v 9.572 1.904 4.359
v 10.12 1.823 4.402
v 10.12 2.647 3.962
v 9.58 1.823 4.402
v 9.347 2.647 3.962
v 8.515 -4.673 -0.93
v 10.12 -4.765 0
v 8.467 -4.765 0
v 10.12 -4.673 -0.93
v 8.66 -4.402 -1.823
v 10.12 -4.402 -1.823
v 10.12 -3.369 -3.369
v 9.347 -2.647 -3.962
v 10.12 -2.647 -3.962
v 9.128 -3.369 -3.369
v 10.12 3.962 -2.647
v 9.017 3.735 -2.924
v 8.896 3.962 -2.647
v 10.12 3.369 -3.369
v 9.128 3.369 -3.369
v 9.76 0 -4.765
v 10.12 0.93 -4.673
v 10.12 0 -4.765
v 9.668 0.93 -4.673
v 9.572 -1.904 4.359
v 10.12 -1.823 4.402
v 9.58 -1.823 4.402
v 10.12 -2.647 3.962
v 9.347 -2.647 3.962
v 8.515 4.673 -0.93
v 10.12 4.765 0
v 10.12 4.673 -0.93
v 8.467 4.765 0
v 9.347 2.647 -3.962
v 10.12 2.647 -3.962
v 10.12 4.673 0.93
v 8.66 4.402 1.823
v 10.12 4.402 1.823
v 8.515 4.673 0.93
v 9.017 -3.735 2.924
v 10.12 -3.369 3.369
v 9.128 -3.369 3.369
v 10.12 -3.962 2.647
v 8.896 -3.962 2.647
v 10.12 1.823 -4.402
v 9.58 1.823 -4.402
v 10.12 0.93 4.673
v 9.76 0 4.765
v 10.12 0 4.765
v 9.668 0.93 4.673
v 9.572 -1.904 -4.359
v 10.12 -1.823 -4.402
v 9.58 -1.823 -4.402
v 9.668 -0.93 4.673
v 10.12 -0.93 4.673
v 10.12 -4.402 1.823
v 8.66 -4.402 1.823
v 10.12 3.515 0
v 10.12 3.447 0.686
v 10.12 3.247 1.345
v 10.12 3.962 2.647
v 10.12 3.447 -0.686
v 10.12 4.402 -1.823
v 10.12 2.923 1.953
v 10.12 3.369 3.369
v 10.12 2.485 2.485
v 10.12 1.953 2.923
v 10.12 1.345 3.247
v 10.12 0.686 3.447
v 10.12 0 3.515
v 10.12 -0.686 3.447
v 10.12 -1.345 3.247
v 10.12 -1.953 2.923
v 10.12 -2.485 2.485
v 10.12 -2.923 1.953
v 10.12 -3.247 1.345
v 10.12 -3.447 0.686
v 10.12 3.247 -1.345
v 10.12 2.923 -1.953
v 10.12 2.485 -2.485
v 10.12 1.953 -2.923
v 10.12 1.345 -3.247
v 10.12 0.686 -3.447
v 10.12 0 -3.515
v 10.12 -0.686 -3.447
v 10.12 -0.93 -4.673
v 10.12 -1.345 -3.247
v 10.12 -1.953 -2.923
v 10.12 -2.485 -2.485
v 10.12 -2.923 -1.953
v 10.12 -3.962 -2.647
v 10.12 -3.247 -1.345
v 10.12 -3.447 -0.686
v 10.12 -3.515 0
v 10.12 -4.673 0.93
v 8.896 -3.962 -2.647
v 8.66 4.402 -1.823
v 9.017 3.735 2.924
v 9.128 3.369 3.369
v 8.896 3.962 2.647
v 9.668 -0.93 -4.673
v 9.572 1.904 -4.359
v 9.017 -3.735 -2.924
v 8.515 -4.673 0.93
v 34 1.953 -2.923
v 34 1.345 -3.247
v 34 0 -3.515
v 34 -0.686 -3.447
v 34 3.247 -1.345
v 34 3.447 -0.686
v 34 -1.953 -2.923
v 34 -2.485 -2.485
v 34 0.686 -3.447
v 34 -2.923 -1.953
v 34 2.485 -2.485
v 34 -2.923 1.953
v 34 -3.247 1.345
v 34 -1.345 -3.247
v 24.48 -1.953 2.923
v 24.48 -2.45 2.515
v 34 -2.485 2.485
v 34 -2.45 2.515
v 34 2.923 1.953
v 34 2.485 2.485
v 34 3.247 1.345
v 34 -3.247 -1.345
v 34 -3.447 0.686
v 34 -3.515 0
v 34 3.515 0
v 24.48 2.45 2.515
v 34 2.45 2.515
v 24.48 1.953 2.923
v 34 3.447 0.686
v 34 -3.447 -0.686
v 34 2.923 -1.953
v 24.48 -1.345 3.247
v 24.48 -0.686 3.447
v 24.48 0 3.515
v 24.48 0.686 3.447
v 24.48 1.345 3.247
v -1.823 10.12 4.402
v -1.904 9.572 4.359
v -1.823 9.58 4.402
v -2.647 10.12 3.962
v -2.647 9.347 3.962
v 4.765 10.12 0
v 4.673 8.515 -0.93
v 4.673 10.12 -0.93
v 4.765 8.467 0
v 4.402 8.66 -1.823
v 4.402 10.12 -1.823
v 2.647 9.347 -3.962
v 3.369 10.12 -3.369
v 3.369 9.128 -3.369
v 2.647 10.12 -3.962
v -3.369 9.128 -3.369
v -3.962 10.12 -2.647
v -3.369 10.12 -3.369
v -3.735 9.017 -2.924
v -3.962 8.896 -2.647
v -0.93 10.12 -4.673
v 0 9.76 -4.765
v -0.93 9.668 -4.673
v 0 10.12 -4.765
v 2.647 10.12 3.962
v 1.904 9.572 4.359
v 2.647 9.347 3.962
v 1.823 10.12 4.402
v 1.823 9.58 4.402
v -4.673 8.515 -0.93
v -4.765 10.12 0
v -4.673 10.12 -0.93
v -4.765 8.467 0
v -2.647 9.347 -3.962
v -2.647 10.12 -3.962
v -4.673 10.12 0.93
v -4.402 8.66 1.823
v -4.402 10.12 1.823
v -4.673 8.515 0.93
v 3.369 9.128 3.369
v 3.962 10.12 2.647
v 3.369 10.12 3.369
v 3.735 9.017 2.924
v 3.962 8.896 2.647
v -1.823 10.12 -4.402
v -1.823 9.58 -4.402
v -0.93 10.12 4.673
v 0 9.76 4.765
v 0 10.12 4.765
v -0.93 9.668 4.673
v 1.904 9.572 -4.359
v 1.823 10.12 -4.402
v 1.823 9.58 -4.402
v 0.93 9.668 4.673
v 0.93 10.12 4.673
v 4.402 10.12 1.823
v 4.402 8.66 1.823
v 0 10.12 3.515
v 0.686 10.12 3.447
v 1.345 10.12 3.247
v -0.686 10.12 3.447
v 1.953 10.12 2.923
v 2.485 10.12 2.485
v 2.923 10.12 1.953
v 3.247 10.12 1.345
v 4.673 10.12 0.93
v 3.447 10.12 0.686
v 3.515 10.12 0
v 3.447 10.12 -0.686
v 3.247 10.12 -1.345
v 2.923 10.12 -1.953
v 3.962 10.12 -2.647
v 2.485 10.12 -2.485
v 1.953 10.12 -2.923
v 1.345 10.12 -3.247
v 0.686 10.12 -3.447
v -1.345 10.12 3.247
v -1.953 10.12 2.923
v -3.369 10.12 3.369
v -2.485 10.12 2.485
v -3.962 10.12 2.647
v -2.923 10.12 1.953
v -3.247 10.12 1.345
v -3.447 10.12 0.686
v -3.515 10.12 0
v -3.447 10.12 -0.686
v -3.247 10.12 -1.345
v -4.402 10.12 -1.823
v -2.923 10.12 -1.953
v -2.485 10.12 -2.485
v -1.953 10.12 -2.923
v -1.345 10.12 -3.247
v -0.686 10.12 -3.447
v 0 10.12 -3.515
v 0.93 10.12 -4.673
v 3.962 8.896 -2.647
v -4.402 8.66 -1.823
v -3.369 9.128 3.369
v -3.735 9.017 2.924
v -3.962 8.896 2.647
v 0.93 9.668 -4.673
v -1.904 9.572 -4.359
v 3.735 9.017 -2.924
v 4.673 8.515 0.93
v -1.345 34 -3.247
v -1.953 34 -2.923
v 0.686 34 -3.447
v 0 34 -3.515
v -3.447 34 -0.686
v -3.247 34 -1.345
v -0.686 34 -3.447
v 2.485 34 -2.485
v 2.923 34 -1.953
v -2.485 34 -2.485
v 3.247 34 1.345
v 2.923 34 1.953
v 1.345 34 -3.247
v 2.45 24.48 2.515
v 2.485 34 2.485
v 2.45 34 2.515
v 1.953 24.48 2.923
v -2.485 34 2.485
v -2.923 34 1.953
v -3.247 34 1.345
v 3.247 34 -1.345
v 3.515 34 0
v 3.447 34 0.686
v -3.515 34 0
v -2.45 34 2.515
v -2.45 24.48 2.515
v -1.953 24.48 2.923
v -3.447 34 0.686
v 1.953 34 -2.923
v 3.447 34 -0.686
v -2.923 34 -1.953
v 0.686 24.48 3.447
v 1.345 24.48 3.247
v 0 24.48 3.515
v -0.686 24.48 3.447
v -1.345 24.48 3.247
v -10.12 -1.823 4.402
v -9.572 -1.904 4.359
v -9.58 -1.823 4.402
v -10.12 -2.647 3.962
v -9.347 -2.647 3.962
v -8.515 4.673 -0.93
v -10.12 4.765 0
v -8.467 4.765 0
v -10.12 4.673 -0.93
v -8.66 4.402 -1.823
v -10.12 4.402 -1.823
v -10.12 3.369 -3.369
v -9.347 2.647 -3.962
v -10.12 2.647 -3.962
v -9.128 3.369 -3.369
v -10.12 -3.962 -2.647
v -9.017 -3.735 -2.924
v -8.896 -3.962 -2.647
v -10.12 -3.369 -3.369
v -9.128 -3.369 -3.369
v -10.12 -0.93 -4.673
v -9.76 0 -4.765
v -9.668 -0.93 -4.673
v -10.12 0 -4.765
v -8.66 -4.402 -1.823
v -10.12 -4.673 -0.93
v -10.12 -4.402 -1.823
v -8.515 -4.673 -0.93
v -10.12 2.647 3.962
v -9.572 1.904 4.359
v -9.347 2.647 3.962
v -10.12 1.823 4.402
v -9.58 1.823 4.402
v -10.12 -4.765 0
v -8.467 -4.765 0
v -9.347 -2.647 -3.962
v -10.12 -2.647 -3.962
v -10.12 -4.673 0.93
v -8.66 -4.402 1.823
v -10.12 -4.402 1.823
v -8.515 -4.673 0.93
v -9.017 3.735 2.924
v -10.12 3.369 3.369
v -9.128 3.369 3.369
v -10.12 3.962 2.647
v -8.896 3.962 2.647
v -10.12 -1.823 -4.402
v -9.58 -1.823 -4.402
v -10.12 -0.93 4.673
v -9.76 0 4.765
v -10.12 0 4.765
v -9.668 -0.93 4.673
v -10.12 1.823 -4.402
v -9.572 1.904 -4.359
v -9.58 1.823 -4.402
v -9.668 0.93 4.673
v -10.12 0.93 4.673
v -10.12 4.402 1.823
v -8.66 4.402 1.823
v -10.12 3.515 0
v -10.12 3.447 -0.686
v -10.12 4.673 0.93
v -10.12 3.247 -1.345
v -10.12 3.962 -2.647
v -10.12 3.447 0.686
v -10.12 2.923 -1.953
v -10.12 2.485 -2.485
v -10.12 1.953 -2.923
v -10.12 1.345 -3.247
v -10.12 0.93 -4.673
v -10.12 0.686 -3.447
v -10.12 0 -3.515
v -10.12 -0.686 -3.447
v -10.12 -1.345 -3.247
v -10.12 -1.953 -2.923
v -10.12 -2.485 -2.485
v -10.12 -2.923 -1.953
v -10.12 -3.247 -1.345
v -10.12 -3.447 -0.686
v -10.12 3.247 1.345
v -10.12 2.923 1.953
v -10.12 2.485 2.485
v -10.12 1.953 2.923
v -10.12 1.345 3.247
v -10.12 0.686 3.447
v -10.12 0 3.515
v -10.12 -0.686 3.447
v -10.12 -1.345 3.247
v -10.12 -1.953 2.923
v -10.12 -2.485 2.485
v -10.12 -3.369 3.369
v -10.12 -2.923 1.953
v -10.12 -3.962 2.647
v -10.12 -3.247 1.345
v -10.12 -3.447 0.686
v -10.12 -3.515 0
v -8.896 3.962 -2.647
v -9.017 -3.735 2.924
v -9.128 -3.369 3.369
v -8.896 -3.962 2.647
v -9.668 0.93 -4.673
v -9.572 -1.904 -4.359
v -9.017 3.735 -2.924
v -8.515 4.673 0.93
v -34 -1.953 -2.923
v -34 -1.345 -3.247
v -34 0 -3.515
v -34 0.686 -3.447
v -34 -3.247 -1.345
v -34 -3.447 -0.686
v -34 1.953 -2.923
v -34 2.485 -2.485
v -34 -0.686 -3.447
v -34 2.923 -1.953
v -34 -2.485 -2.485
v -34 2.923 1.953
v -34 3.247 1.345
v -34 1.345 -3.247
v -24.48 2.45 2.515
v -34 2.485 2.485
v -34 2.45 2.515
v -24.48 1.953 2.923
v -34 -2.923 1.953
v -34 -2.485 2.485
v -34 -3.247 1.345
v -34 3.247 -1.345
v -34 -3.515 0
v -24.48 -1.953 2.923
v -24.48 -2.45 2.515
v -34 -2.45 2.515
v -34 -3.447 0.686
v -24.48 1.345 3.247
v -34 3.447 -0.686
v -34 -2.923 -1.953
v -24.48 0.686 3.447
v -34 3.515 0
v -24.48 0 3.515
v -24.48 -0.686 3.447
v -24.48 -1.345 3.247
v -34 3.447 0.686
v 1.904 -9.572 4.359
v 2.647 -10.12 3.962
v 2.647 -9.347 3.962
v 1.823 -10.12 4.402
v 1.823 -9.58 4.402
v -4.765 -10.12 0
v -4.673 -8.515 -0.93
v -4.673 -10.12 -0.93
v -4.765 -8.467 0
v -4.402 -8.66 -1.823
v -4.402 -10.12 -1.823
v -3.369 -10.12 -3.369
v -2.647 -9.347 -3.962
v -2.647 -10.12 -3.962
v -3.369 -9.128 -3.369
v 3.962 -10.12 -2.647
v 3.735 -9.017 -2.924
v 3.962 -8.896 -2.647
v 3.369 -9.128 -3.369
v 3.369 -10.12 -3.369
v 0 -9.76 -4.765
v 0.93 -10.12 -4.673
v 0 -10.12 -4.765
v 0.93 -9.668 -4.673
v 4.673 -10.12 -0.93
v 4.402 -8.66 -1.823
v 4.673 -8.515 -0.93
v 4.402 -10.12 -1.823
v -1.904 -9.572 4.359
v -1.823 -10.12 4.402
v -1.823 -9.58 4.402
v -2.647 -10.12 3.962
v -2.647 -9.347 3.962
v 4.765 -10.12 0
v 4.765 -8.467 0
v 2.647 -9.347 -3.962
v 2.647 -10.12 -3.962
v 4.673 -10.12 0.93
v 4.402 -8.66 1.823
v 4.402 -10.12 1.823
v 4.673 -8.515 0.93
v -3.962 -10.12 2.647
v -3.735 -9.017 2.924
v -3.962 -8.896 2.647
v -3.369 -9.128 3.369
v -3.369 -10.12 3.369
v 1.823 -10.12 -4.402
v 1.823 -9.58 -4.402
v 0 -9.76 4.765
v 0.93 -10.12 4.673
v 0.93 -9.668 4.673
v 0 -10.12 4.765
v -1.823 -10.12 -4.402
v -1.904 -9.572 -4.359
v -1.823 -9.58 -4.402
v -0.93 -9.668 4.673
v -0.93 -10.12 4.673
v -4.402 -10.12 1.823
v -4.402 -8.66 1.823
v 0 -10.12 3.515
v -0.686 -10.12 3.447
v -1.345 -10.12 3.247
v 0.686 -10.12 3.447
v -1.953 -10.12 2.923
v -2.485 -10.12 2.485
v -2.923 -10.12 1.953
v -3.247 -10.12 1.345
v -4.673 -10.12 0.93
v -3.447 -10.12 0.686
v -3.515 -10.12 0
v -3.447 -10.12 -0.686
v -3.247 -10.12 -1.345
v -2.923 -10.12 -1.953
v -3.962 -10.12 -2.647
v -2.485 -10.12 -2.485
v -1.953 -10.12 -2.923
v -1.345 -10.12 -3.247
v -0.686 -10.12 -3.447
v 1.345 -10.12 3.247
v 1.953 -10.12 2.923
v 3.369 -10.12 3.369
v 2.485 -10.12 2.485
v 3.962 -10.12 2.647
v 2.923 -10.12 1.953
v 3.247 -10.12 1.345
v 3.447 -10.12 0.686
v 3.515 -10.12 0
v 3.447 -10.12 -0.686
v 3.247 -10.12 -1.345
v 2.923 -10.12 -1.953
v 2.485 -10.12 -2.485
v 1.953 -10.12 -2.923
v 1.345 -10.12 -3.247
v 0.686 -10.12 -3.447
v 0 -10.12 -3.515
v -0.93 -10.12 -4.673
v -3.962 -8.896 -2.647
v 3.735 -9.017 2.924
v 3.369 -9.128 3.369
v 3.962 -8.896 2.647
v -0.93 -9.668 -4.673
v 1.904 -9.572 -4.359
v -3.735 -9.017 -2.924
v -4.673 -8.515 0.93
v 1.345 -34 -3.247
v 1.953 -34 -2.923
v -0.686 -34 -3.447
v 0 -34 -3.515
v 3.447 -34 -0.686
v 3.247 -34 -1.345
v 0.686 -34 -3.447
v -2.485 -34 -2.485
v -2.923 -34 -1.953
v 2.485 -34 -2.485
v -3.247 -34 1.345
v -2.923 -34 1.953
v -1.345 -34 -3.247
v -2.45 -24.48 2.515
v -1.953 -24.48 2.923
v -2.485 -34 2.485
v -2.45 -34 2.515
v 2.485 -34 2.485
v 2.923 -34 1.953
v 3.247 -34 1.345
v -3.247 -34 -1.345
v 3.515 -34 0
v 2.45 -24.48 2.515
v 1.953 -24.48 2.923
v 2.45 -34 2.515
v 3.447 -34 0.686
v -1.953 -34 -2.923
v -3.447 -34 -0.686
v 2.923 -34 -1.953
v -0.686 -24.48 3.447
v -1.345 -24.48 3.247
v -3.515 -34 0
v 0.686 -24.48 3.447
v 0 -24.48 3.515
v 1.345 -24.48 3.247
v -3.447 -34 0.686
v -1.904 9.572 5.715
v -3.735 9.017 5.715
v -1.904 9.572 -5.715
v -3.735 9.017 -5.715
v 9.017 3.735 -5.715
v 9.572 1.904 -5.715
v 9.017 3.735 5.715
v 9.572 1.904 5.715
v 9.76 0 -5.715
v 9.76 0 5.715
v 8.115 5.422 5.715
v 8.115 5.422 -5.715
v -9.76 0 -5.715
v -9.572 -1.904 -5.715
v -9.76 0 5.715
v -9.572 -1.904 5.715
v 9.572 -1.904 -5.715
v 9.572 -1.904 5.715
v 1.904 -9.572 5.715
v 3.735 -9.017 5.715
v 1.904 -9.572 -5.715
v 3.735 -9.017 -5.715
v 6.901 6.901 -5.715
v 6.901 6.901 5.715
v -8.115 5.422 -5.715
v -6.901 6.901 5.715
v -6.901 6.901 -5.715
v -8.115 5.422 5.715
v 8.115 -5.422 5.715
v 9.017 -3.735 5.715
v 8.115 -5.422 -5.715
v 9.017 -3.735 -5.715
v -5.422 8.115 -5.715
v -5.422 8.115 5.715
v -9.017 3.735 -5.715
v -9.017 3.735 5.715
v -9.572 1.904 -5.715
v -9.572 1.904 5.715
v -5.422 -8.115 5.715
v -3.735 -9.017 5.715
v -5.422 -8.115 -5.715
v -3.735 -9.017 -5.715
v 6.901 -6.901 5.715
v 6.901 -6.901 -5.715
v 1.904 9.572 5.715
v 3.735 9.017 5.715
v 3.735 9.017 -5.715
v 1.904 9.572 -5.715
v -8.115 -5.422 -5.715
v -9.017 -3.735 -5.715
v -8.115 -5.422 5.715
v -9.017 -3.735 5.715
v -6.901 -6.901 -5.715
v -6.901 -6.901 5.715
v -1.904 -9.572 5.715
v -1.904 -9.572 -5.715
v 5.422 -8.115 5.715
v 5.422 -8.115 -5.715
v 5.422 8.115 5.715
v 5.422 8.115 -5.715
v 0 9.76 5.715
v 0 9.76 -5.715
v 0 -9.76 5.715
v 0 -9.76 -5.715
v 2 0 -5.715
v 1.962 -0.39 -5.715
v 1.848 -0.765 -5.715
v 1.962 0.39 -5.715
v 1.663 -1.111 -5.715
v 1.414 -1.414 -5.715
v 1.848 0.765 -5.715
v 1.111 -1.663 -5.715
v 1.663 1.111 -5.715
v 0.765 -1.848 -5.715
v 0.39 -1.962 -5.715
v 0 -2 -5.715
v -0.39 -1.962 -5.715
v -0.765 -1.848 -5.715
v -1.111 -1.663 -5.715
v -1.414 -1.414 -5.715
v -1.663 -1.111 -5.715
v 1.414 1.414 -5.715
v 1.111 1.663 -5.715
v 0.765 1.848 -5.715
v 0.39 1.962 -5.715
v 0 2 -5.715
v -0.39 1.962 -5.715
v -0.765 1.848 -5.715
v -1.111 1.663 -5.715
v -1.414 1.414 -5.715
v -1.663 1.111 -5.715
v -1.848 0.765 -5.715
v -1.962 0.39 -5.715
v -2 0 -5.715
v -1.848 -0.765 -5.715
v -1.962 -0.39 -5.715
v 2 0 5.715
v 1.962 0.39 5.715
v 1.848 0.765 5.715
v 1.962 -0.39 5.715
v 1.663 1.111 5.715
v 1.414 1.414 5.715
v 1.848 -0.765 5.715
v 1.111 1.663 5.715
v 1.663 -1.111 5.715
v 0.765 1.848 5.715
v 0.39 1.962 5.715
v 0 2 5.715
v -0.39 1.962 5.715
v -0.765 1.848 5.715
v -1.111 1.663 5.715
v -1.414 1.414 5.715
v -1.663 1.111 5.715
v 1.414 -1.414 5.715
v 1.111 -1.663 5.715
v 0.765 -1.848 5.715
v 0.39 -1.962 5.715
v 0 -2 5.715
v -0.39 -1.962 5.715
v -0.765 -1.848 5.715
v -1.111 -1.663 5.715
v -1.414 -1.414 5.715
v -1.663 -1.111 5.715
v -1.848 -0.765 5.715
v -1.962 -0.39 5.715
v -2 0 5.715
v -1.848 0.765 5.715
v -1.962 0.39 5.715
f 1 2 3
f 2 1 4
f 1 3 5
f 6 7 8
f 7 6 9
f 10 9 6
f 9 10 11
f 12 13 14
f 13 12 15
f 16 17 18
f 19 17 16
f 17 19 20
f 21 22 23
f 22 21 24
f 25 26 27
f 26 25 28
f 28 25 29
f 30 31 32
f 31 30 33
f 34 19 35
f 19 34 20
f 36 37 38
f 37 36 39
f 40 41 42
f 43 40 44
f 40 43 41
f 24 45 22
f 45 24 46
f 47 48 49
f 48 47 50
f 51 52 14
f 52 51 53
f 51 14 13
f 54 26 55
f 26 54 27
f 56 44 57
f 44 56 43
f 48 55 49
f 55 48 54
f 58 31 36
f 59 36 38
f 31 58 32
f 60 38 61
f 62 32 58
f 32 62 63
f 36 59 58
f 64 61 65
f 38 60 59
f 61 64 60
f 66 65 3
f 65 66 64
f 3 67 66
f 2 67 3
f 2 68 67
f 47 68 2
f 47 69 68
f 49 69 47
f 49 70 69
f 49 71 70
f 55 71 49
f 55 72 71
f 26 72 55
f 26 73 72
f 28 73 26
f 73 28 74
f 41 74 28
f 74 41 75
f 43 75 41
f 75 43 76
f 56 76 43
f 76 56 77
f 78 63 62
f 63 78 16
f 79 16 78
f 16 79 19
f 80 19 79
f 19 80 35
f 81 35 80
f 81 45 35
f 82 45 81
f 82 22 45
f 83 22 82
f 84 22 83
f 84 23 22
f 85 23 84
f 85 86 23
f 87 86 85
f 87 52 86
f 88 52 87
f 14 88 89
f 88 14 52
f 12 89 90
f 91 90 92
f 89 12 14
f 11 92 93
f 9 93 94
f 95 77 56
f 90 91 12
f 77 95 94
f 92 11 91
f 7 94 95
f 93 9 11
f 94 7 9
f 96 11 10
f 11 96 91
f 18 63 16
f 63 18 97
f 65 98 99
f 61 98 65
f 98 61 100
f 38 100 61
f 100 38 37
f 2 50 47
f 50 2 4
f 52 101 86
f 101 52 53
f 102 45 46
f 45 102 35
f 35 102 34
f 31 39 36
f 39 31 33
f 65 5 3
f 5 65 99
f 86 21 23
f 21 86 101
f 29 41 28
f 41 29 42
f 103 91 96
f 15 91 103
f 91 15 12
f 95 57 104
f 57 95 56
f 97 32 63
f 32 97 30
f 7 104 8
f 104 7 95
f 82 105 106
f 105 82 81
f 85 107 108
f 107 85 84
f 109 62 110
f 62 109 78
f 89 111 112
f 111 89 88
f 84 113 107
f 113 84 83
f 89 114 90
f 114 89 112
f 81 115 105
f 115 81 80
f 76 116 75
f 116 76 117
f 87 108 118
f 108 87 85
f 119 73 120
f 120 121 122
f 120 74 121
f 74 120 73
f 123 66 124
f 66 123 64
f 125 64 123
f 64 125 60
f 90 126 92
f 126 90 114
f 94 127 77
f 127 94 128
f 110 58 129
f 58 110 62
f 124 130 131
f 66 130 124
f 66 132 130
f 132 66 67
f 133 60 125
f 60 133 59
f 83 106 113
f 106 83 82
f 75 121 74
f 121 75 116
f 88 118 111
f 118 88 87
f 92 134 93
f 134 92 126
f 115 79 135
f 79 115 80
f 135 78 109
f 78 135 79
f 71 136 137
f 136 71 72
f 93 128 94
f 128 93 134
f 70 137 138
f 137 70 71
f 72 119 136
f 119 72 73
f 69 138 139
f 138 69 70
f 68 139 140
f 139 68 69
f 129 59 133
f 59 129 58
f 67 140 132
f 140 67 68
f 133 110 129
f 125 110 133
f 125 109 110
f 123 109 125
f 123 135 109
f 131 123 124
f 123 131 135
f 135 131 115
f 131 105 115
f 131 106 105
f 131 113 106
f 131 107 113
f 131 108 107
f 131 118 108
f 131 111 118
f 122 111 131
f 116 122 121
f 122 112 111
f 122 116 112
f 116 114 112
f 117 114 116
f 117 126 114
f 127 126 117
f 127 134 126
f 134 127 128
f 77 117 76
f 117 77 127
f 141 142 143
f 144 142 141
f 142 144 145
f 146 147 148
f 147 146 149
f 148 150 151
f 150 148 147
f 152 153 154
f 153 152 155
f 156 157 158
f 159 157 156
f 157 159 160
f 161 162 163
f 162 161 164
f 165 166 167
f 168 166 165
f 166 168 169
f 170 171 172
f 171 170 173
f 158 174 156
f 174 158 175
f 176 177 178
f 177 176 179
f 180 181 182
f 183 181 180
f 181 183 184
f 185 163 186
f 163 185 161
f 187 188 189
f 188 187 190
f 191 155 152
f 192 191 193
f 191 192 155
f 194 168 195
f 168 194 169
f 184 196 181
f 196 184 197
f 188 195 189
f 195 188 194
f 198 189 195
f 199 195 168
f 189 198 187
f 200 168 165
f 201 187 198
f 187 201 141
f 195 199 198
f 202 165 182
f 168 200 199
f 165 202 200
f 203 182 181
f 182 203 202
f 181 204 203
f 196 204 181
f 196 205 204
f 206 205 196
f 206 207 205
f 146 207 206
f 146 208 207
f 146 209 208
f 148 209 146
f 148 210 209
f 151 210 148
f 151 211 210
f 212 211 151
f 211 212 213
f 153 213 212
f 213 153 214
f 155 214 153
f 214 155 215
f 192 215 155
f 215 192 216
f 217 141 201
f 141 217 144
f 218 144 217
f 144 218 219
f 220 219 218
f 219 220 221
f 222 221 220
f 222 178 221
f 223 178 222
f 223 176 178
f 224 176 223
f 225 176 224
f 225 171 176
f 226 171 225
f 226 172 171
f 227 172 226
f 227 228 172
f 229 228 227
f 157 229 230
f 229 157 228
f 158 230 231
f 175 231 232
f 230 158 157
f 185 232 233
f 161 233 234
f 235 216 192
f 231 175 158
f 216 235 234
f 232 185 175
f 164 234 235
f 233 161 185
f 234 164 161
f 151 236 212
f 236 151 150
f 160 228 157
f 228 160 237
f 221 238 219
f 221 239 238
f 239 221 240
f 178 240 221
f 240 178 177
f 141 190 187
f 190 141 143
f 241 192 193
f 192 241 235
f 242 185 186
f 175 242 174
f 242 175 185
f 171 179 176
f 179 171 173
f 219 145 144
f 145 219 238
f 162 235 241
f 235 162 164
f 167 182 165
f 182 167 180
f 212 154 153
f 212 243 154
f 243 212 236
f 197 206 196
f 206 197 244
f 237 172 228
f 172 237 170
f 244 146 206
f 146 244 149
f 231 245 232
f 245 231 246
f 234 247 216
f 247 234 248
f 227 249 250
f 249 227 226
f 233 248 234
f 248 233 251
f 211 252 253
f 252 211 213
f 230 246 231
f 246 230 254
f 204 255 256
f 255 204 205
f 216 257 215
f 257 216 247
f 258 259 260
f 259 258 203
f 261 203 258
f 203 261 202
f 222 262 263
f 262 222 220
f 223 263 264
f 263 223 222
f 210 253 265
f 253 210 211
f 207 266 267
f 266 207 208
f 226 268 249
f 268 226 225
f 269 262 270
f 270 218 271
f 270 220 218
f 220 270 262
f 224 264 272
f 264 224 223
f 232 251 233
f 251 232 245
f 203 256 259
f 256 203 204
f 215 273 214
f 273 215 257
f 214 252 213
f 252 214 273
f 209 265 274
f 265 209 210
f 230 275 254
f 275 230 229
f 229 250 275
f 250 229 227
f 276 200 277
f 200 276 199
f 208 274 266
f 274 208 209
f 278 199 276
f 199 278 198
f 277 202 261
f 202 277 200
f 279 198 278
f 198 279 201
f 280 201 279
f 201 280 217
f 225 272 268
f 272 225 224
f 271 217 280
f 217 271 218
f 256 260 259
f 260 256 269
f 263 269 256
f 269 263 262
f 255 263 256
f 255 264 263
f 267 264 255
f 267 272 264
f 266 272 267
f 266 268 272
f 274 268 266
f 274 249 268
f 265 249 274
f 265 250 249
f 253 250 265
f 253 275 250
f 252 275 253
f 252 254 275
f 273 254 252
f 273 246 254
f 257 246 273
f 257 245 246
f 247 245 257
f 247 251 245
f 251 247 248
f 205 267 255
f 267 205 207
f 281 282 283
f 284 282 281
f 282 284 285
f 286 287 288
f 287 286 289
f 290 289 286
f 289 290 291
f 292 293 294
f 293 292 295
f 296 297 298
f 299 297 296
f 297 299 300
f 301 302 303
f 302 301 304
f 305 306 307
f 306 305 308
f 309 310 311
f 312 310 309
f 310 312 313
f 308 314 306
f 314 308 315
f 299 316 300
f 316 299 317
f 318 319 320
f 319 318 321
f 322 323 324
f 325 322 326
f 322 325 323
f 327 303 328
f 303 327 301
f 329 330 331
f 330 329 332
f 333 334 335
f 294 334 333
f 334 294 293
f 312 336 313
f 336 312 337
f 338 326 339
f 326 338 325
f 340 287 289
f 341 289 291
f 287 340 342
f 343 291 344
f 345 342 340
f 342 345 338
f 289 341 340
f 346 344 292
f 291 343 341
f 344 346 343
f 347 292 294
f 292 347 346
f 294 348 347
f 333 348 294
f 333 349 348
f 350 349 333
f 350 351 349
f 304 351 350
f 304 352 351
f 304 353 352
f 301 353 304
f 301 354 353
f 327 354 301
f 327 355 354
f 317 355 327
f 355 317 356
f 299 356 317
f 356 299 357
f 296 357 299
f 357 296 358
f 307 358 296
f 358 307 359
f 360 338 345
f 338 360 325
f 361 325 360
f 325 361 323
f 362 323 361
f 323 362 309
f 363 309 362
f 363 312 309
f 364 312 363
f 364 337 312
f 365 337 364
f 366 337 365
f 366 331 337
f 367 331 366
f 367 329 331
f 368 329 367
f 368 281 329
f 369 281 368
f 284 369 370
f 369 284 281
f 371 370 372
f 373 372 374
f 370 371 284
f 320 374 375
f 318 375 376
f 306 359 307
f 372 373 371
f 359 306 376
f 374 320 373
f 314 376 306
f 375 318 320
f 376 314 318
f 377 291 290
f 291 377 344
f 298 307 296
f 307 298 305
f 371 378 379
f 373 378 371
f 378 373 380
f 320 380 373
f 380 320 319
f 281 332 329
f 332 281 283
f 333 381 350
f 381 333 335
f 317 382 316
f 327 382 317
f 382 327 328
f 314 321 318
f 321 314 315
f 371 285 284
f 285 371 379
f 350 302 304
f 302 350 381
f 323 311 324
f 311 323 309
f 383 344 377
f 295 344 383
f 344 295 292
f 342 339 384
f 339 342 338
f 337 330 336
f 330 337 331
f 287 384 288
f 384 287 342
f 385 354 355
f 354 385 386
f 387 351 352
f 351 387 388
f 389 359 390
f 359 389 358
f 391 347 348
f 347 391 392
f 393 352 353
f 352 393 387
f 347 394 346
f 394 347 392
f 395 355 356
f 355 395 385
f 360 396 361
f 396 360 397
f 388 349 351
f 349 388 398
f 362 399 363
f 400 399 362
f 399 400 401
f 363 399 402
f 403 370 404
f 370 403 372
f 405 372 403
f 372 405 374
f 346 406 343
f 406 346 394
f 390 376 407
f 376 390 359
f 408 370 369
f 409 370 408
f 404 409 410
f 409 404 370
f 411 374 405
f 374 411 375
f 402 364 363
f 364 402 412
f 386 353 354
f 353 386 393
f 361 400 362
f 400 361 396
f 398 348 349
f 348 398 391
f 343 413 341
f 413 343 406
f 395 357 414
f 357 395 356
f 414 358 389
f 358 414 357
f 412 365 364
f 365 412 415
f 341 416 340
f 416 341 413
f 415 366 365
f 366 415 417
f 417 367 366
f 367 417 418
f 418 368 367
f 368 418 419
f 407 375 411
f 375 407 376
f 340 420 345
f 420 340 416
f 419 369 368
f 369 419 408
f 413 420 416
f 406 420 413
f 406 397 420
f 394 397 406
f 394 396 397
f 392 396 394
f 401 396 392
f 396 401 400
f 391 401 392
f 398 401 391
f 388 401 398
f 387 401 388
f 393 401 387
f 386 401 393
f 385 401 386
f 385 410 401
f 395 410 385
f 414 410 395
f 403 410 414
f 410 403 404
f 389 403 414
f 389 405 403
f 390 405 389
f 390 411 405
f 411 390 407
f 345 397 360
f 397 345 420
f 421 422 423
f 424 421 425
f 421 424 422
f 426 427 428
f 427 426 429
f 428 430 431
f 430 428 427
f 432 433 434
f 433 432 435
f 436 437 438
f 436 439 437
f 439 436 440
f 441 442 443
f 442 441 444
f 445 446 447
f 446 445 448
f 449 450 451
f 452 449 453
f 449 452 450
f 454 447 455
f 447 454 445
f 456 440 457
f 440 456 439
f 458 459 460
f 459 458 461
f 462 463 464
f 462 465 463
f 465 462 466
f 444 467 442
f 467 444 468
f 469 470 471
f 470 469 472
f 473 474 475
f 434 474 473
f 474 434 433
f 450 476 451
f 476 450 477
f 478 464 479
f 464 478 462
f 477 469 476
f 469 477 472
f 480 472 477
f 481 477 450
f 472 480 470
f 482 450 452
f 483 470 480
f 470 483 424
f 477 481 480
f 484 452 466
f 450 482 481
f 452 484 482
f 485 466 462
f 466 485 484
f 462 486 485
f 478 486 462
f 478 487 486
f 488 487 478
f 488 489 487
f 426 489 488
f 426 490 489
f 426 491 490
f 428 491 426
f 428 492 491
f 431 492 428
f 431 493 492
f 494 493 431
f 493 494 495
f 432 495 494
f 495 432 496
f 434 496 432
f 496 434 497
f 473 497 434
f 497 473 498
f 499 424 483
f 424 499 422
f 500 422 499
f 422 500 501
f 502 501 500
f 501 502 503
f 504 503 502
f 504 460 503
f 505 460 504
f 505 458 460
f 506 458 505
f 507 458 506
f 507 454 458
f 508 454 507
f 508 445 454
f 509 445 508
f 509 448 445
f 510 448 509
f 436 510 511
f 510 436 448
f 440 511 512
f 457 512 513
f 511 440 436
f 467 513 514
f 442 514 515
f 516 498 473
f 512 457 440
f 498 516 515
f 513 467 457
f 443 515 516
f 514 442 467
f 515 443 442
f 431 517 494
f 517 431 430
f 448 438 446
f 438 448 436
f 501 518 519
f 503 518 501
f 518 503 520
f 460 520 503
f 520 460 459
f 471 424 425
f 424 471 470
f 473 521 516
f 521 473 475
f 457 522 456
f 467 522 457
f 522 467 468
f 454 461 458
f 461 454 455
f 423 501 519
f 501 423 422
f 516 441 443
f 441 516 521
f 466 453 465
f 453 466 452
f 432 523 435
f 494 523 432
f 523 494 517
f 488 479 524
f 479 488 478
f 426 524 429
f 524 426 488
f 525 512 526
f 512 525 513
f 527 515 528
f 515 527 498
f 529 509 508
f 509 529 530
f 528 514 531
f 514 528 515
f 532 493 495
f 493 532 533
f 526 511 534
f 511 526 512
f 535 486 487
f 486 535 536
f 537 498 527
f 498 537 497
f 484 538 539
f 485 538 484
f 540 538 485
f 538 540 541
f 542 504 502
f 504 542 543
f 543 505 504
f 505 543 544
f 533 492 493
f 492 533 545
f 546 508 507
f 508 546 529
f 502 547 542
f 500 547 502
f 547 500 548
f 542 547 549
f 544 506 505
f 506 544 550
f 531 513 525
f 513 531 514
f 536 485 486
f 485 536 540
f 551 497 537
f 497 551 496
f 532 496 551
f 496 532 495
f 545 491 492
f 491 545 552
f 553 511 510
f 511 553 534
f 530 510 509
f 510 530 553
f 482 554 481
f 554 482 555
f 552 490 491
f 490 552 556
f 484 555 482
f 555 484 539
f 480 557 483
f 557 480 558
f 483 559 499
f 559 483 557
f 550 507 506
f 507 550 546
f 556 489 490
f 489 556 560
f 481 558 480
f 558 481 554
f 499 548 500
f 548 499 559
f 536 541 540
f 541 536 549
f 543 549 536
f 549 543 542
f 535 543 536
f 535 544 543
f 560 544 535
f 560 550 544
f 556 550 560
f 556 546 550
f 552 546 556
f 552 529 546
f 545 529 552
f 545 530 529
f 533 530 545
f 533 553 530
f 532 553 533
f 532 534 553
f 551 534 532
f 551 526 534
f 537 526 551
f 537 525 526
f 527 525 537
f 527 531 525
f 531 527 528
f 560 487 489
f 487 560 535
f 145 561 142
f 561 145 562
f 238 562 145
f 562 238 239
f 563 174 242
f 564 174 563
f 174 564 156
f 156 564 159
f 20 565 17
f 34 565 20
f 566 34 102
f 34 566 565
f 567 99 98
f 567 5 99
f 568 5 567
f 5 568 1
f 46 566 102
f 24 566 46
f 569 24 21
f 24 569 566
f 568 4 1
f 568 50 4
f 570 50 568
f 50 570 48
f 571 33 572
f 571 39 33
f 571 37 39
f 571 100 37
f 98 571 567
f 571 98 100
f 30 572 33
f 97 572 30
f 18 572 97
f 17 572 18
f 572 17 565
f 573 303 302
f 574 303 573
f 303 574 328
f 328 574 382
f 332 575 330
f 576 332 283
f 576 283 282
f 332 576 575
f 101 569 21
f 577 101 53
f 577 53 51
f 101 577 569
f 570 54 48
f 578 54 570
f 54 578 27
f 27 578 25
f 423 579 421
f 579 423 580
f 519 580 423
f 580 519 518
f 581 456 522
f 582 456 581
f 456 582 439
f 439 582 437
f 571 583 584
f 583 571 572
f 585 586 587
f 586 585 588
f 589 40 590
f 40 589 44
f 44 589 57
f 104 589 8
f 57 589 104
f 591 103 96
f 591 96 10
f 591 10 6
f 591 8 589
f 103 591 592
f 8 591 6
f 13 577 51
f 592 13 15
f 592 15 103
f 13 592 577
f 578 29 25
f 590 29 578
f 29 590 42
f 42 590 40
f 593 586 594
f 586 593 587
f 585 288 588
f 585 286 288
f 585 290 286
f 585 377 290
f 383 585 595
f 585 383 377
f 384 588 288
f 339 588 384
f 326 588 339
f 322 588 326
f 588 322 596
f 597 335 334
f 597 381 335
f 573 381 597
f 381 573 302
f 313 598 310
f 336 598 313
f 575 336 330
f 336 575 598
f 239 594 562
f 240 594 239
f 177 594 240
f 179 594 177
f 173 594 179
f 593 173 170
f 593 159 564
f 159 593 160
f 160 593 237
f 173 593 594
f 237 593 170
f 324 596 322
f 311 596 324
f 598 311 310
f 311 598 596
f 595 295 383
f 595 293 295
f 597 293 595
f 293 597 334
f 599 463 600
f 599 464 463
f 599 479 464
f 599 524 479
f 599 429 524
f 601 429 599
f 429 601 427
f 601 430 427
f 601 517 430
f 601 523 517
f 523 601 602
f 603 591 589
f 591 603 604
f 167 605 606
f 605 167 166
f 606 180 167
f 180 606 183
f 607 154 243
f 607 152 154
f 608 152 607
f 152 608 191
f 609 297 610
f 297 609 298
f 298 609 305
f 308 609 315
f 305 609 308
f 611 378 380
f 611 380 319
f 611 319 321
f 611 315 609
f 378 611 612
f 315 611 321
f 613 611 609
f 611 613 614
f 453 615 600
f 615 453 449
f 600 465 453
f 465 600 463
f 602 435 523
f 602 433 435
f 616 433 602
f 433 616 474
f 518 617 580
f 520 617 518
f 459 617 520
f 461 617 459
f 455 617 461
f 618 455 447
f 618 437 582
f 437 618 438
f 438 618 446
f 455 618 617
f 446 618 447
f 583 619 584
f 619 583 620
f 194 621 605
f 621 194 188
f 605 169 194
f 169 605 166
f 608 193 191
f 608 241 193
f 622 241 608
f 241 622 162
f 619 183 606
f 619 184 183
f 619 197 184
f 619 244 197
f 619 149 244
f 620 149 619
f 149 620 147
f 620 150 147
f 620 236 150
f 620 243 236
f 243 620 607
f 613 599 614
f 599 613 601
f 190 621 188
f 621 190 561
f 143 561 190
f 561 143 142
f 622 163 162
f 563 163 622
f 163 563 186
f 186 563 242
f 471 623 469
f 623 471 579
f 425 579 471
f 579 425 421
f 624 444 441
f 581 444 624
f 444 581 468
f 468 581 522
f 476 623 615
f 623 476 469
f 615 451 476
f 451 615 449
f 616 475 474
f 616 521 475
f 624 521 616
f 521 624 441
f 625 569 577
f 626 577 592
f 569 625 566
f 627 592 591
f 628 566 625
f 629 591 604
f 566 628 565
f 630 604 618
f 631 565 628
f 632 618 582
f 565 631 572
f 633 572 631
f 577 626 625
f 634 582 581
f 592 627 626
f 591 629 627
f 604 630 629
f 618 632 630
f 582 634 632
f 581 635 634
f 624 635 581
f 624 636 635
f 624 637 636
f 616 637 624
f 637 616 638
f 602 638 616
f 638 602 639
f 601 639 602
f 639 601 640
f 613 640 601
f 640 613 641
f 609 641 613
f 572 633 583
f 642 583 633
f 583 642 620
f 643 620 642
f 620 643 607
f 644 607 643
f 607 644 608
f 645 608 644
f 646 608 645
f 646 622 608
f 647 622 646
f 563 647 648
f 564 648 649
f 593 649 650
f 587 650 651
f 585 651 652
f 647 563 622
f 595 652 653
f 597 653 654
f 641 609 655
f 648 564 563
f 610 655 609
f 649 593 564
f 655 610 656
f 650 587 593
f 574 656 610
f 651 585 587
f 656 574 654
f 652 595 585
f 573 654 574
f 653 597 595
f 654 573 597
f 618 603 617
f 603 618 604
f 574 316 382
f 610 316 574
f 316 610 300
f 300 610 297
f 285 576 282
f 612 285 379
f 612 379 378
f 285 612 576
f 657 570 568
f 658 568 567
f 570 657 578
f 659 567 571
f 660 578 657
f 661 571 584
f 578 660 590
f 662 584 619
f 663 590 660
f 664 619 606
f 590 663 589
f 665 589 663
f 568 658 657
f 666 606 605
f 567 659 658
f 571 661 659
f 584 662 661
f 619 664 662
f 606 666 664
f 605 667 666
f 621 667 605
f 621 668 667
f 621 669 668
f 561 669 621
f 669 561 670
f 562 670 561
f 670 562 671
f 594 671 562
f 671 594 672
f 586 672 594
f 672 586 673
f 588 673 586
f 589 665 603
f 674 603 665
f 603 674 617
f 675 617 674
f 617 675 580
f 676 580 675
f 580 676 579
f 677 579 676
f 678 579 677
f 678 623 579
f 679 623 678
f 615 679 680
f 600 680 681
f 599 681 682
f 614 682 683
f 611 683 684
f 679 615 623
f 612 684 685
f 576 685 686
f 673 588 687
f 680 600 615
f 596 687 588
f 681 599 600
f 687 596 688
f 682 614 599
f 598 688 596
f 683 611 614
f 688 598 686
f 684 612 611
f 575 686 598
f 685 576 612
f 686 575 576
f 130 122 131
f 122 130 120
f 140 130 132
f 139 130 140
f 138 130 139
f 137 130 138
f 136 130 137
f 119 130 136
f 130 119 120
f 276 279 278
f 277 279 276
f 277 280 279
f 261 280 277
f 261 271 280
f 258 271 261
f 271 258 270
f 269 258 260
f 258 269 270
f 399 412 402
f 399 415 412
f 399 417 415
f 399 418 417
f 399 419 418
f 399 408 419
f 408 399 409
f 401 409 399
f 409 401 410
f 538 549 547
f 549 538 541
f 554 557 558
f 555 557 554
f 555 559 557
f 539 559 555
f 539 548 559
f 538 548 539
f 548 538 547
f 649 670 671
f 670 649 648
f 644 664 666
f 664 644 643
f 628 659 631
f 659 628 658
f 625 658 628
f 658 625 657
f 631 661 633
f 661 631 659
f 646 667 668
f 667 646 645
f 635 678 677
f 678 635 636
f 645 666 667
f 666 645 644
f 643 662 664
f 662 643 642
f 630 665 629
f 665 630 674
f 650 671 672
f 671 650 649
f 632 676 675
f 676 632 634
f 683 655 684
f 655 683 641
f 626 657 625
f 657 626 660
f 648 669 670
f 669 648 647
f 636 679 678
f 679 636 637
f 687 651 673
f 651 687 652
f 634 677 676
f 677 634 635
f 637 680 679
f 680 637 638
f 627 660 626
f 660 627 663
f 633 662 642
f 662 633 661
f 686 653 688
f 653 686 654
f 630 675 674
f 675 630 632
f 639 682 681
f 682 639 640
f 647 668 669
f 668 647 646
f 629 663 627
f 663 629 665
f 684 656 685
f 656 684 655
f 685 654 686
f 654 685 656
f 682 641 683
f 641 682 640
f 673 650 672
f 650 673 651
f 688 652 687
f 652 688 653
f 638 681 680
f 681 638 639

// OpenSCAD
$fn = 32;

// ----------------------------------------------------------------------
// Cardan cross: 68 mm span, 9.53 mm trunnions
// ----------------------------------------------------------------------

// --- parameters (mm) ---
journal_d = 9.53;         // trunnion diameter
arm_len = 34;             // trunnion length from the centre
step_r = 3.24;            // step position from the centre
step_d = 7.03;            // journal diameter after the step
hub_d = 19.52;            // hub diameter
hub_h = 11.43;            // hub height
bore_d = 4;               // hub bore
flat_d = 1;               // depth of the journal flat
flat_len = 9.52;          // length of the journal flat

difference() {
  union() {
    /* hub along the joint axis */
    cylinder(h = hub_h, d = hub_d, center = true);
    for (a = [0 : 90 : 270]) rotate([0, 0, a]) {
      /* trunnion, sunk into the hub */
      translate([hub_d / 4, 0, 0]) rotate([0, 90, 0]) cylinder(h = step_r + 2, d = journal_d);
      /* stepped journal out to the tip */
      translate([step_r - 0.5, 0, 0]) rotate([0, 90, 0]) cylinder(h = arm_len + 0.5 - step_r, d = step_d);
    }
  }
  /* lubrication bore through the hub, 2.5 mm clear on both sides */
  translate([0, 0, -hub_h / 2 - 2.5]) cylinder(h = hub_h + 5, d = bore_d);
  /* machined flat on each journal tip */
  for (a = [0 : 90 : 270]) rotate([0, 0, a]) {
    translate([arm_len - flat_len, -step_d, step_d / 2 - flat_d]) cube([flat_len + 0.5, 2 * step_d, flat_d + 2.5]);
  }
}
